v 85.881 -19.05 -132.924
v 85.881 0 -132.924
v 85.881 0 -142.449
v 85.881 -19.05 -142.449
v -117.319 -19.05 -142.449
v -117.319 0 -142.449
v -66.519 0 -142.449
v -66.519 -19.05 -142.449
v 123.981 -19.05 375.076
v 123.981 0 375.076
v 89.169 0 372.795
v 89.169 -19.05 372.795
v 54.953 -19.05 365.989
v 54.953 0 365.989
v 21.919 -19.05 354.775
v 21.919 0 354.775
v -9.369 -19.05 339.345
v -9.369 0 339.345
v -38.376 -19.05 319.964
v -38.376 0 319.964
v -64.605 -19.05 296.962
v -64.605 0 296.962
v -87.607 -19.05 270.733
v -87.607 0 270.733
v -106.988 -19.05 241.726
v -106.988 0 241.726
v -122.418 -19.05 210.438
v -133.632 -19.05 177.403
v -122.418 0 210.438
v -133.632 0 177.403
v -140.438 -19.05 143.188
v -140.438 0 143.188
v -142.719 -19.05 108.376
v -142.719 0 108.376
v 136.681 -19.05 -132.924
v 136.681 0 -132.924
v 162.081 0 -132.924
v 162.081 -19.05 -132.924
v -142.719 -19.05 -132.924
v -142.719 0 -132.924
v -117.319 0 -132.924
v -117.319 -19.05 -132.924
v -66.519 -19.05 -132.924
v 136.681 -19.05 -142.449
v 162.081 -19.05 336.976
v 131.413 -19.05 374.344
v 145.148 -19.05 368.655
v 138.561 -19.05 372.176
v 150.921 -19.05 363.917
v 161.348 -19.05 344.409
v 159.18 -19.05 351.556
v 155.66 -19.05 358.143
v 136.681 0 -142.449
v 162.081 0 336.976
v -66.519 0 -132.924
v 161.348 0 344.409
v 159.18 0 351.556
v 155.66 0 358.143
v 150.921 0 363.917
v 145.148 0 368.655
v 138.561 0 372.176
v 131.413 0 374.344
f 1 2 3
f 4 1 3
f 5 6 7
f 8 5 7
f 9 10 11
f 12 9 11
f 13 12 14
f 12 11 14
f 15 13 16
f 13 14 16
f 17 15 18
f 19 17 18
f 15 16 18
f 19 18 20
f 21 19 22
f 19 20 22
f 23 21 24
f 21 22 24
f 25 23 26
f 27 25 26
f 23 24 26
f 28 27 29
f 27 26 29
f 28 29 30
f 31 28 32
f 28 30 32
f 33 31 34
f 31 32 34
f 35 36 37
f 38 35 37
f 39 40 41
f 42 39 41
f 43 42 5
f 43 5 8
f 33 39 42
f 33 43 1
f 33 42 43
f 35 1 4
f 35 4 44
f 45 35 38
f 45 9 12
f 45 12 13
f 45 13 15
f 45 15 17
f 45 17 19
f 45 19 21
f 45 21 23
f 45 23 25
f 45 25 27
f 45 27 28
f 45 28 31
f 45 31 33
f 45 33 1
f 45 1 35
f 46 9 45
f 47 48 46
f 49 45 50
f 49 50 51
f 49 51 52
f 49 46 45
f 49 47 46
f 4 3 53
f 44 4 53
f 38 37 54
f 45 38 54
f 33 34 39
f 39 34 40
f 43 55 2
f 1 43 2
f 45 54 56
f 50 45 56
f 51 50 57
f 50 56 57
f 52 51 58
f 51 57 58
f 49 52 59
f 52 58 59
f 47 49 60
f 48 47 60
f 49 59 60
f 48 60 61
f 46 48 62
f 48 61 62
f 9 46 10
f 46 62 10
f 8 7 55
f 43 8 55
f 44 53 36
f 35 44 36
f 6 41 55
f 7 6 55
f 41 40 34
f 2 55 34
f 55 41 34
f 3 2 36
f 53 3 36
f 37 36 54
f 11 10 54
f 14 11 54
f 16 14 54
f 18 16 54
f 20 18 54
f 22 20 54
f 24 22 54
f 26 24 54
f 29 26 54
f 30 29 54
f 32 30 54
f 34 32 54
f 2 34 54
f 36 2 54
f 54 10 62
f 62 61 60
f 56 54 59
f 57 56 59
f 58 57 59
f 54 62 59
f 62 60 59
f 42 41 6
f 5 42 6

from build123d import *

# Parameters (mm, degrees)
F1_DEPTH = 19.05


with BuildPart() as f1:
    # F0 (on Front) → F1 (new body)
    with BuildSketch(Plane.XZ):
        with BuildLine():
            Line((-142.719461, 108.376235), (-142.719461, -132.923765))
            Line((-142.719461, -132.923765), (-117.319461, -132.923765))
            Line((-117.319461, -132.923765), (-117.319461, -142.448765))
            Line((-117.319461, -142.448765), (-66.519461, -142.448765))
            Line((-66.519461, -142.448765), (-66.519461, -132.923765))
            Line((-66.519461, -132.923765), (85.880539, -132.923765))
            Line((85.880539, -132.923765), (85.880539, -142.448765))
            Line((85.880539, -142.448765), (136.680539, -142.448765))
            Line((136.680539, -142.448765), (136.680539, -132.923765))
            Line((136.680539, -132.923765), (162.080539, -132.923765))
            Line((162.080539, -132.923765), (162.080539, 336.976235))
            ThreePointArc((162.080539, 336.976235), (150.921307, 363.917003), (123.980539, 375.076235))
            ThreePointArc((123.980539, 375.076235), (-64.60484, 296.961613), (-142.719461, 108.376235))
        make_face()
    extrude(amount=F1_DEPTH)


solid = f1.part
